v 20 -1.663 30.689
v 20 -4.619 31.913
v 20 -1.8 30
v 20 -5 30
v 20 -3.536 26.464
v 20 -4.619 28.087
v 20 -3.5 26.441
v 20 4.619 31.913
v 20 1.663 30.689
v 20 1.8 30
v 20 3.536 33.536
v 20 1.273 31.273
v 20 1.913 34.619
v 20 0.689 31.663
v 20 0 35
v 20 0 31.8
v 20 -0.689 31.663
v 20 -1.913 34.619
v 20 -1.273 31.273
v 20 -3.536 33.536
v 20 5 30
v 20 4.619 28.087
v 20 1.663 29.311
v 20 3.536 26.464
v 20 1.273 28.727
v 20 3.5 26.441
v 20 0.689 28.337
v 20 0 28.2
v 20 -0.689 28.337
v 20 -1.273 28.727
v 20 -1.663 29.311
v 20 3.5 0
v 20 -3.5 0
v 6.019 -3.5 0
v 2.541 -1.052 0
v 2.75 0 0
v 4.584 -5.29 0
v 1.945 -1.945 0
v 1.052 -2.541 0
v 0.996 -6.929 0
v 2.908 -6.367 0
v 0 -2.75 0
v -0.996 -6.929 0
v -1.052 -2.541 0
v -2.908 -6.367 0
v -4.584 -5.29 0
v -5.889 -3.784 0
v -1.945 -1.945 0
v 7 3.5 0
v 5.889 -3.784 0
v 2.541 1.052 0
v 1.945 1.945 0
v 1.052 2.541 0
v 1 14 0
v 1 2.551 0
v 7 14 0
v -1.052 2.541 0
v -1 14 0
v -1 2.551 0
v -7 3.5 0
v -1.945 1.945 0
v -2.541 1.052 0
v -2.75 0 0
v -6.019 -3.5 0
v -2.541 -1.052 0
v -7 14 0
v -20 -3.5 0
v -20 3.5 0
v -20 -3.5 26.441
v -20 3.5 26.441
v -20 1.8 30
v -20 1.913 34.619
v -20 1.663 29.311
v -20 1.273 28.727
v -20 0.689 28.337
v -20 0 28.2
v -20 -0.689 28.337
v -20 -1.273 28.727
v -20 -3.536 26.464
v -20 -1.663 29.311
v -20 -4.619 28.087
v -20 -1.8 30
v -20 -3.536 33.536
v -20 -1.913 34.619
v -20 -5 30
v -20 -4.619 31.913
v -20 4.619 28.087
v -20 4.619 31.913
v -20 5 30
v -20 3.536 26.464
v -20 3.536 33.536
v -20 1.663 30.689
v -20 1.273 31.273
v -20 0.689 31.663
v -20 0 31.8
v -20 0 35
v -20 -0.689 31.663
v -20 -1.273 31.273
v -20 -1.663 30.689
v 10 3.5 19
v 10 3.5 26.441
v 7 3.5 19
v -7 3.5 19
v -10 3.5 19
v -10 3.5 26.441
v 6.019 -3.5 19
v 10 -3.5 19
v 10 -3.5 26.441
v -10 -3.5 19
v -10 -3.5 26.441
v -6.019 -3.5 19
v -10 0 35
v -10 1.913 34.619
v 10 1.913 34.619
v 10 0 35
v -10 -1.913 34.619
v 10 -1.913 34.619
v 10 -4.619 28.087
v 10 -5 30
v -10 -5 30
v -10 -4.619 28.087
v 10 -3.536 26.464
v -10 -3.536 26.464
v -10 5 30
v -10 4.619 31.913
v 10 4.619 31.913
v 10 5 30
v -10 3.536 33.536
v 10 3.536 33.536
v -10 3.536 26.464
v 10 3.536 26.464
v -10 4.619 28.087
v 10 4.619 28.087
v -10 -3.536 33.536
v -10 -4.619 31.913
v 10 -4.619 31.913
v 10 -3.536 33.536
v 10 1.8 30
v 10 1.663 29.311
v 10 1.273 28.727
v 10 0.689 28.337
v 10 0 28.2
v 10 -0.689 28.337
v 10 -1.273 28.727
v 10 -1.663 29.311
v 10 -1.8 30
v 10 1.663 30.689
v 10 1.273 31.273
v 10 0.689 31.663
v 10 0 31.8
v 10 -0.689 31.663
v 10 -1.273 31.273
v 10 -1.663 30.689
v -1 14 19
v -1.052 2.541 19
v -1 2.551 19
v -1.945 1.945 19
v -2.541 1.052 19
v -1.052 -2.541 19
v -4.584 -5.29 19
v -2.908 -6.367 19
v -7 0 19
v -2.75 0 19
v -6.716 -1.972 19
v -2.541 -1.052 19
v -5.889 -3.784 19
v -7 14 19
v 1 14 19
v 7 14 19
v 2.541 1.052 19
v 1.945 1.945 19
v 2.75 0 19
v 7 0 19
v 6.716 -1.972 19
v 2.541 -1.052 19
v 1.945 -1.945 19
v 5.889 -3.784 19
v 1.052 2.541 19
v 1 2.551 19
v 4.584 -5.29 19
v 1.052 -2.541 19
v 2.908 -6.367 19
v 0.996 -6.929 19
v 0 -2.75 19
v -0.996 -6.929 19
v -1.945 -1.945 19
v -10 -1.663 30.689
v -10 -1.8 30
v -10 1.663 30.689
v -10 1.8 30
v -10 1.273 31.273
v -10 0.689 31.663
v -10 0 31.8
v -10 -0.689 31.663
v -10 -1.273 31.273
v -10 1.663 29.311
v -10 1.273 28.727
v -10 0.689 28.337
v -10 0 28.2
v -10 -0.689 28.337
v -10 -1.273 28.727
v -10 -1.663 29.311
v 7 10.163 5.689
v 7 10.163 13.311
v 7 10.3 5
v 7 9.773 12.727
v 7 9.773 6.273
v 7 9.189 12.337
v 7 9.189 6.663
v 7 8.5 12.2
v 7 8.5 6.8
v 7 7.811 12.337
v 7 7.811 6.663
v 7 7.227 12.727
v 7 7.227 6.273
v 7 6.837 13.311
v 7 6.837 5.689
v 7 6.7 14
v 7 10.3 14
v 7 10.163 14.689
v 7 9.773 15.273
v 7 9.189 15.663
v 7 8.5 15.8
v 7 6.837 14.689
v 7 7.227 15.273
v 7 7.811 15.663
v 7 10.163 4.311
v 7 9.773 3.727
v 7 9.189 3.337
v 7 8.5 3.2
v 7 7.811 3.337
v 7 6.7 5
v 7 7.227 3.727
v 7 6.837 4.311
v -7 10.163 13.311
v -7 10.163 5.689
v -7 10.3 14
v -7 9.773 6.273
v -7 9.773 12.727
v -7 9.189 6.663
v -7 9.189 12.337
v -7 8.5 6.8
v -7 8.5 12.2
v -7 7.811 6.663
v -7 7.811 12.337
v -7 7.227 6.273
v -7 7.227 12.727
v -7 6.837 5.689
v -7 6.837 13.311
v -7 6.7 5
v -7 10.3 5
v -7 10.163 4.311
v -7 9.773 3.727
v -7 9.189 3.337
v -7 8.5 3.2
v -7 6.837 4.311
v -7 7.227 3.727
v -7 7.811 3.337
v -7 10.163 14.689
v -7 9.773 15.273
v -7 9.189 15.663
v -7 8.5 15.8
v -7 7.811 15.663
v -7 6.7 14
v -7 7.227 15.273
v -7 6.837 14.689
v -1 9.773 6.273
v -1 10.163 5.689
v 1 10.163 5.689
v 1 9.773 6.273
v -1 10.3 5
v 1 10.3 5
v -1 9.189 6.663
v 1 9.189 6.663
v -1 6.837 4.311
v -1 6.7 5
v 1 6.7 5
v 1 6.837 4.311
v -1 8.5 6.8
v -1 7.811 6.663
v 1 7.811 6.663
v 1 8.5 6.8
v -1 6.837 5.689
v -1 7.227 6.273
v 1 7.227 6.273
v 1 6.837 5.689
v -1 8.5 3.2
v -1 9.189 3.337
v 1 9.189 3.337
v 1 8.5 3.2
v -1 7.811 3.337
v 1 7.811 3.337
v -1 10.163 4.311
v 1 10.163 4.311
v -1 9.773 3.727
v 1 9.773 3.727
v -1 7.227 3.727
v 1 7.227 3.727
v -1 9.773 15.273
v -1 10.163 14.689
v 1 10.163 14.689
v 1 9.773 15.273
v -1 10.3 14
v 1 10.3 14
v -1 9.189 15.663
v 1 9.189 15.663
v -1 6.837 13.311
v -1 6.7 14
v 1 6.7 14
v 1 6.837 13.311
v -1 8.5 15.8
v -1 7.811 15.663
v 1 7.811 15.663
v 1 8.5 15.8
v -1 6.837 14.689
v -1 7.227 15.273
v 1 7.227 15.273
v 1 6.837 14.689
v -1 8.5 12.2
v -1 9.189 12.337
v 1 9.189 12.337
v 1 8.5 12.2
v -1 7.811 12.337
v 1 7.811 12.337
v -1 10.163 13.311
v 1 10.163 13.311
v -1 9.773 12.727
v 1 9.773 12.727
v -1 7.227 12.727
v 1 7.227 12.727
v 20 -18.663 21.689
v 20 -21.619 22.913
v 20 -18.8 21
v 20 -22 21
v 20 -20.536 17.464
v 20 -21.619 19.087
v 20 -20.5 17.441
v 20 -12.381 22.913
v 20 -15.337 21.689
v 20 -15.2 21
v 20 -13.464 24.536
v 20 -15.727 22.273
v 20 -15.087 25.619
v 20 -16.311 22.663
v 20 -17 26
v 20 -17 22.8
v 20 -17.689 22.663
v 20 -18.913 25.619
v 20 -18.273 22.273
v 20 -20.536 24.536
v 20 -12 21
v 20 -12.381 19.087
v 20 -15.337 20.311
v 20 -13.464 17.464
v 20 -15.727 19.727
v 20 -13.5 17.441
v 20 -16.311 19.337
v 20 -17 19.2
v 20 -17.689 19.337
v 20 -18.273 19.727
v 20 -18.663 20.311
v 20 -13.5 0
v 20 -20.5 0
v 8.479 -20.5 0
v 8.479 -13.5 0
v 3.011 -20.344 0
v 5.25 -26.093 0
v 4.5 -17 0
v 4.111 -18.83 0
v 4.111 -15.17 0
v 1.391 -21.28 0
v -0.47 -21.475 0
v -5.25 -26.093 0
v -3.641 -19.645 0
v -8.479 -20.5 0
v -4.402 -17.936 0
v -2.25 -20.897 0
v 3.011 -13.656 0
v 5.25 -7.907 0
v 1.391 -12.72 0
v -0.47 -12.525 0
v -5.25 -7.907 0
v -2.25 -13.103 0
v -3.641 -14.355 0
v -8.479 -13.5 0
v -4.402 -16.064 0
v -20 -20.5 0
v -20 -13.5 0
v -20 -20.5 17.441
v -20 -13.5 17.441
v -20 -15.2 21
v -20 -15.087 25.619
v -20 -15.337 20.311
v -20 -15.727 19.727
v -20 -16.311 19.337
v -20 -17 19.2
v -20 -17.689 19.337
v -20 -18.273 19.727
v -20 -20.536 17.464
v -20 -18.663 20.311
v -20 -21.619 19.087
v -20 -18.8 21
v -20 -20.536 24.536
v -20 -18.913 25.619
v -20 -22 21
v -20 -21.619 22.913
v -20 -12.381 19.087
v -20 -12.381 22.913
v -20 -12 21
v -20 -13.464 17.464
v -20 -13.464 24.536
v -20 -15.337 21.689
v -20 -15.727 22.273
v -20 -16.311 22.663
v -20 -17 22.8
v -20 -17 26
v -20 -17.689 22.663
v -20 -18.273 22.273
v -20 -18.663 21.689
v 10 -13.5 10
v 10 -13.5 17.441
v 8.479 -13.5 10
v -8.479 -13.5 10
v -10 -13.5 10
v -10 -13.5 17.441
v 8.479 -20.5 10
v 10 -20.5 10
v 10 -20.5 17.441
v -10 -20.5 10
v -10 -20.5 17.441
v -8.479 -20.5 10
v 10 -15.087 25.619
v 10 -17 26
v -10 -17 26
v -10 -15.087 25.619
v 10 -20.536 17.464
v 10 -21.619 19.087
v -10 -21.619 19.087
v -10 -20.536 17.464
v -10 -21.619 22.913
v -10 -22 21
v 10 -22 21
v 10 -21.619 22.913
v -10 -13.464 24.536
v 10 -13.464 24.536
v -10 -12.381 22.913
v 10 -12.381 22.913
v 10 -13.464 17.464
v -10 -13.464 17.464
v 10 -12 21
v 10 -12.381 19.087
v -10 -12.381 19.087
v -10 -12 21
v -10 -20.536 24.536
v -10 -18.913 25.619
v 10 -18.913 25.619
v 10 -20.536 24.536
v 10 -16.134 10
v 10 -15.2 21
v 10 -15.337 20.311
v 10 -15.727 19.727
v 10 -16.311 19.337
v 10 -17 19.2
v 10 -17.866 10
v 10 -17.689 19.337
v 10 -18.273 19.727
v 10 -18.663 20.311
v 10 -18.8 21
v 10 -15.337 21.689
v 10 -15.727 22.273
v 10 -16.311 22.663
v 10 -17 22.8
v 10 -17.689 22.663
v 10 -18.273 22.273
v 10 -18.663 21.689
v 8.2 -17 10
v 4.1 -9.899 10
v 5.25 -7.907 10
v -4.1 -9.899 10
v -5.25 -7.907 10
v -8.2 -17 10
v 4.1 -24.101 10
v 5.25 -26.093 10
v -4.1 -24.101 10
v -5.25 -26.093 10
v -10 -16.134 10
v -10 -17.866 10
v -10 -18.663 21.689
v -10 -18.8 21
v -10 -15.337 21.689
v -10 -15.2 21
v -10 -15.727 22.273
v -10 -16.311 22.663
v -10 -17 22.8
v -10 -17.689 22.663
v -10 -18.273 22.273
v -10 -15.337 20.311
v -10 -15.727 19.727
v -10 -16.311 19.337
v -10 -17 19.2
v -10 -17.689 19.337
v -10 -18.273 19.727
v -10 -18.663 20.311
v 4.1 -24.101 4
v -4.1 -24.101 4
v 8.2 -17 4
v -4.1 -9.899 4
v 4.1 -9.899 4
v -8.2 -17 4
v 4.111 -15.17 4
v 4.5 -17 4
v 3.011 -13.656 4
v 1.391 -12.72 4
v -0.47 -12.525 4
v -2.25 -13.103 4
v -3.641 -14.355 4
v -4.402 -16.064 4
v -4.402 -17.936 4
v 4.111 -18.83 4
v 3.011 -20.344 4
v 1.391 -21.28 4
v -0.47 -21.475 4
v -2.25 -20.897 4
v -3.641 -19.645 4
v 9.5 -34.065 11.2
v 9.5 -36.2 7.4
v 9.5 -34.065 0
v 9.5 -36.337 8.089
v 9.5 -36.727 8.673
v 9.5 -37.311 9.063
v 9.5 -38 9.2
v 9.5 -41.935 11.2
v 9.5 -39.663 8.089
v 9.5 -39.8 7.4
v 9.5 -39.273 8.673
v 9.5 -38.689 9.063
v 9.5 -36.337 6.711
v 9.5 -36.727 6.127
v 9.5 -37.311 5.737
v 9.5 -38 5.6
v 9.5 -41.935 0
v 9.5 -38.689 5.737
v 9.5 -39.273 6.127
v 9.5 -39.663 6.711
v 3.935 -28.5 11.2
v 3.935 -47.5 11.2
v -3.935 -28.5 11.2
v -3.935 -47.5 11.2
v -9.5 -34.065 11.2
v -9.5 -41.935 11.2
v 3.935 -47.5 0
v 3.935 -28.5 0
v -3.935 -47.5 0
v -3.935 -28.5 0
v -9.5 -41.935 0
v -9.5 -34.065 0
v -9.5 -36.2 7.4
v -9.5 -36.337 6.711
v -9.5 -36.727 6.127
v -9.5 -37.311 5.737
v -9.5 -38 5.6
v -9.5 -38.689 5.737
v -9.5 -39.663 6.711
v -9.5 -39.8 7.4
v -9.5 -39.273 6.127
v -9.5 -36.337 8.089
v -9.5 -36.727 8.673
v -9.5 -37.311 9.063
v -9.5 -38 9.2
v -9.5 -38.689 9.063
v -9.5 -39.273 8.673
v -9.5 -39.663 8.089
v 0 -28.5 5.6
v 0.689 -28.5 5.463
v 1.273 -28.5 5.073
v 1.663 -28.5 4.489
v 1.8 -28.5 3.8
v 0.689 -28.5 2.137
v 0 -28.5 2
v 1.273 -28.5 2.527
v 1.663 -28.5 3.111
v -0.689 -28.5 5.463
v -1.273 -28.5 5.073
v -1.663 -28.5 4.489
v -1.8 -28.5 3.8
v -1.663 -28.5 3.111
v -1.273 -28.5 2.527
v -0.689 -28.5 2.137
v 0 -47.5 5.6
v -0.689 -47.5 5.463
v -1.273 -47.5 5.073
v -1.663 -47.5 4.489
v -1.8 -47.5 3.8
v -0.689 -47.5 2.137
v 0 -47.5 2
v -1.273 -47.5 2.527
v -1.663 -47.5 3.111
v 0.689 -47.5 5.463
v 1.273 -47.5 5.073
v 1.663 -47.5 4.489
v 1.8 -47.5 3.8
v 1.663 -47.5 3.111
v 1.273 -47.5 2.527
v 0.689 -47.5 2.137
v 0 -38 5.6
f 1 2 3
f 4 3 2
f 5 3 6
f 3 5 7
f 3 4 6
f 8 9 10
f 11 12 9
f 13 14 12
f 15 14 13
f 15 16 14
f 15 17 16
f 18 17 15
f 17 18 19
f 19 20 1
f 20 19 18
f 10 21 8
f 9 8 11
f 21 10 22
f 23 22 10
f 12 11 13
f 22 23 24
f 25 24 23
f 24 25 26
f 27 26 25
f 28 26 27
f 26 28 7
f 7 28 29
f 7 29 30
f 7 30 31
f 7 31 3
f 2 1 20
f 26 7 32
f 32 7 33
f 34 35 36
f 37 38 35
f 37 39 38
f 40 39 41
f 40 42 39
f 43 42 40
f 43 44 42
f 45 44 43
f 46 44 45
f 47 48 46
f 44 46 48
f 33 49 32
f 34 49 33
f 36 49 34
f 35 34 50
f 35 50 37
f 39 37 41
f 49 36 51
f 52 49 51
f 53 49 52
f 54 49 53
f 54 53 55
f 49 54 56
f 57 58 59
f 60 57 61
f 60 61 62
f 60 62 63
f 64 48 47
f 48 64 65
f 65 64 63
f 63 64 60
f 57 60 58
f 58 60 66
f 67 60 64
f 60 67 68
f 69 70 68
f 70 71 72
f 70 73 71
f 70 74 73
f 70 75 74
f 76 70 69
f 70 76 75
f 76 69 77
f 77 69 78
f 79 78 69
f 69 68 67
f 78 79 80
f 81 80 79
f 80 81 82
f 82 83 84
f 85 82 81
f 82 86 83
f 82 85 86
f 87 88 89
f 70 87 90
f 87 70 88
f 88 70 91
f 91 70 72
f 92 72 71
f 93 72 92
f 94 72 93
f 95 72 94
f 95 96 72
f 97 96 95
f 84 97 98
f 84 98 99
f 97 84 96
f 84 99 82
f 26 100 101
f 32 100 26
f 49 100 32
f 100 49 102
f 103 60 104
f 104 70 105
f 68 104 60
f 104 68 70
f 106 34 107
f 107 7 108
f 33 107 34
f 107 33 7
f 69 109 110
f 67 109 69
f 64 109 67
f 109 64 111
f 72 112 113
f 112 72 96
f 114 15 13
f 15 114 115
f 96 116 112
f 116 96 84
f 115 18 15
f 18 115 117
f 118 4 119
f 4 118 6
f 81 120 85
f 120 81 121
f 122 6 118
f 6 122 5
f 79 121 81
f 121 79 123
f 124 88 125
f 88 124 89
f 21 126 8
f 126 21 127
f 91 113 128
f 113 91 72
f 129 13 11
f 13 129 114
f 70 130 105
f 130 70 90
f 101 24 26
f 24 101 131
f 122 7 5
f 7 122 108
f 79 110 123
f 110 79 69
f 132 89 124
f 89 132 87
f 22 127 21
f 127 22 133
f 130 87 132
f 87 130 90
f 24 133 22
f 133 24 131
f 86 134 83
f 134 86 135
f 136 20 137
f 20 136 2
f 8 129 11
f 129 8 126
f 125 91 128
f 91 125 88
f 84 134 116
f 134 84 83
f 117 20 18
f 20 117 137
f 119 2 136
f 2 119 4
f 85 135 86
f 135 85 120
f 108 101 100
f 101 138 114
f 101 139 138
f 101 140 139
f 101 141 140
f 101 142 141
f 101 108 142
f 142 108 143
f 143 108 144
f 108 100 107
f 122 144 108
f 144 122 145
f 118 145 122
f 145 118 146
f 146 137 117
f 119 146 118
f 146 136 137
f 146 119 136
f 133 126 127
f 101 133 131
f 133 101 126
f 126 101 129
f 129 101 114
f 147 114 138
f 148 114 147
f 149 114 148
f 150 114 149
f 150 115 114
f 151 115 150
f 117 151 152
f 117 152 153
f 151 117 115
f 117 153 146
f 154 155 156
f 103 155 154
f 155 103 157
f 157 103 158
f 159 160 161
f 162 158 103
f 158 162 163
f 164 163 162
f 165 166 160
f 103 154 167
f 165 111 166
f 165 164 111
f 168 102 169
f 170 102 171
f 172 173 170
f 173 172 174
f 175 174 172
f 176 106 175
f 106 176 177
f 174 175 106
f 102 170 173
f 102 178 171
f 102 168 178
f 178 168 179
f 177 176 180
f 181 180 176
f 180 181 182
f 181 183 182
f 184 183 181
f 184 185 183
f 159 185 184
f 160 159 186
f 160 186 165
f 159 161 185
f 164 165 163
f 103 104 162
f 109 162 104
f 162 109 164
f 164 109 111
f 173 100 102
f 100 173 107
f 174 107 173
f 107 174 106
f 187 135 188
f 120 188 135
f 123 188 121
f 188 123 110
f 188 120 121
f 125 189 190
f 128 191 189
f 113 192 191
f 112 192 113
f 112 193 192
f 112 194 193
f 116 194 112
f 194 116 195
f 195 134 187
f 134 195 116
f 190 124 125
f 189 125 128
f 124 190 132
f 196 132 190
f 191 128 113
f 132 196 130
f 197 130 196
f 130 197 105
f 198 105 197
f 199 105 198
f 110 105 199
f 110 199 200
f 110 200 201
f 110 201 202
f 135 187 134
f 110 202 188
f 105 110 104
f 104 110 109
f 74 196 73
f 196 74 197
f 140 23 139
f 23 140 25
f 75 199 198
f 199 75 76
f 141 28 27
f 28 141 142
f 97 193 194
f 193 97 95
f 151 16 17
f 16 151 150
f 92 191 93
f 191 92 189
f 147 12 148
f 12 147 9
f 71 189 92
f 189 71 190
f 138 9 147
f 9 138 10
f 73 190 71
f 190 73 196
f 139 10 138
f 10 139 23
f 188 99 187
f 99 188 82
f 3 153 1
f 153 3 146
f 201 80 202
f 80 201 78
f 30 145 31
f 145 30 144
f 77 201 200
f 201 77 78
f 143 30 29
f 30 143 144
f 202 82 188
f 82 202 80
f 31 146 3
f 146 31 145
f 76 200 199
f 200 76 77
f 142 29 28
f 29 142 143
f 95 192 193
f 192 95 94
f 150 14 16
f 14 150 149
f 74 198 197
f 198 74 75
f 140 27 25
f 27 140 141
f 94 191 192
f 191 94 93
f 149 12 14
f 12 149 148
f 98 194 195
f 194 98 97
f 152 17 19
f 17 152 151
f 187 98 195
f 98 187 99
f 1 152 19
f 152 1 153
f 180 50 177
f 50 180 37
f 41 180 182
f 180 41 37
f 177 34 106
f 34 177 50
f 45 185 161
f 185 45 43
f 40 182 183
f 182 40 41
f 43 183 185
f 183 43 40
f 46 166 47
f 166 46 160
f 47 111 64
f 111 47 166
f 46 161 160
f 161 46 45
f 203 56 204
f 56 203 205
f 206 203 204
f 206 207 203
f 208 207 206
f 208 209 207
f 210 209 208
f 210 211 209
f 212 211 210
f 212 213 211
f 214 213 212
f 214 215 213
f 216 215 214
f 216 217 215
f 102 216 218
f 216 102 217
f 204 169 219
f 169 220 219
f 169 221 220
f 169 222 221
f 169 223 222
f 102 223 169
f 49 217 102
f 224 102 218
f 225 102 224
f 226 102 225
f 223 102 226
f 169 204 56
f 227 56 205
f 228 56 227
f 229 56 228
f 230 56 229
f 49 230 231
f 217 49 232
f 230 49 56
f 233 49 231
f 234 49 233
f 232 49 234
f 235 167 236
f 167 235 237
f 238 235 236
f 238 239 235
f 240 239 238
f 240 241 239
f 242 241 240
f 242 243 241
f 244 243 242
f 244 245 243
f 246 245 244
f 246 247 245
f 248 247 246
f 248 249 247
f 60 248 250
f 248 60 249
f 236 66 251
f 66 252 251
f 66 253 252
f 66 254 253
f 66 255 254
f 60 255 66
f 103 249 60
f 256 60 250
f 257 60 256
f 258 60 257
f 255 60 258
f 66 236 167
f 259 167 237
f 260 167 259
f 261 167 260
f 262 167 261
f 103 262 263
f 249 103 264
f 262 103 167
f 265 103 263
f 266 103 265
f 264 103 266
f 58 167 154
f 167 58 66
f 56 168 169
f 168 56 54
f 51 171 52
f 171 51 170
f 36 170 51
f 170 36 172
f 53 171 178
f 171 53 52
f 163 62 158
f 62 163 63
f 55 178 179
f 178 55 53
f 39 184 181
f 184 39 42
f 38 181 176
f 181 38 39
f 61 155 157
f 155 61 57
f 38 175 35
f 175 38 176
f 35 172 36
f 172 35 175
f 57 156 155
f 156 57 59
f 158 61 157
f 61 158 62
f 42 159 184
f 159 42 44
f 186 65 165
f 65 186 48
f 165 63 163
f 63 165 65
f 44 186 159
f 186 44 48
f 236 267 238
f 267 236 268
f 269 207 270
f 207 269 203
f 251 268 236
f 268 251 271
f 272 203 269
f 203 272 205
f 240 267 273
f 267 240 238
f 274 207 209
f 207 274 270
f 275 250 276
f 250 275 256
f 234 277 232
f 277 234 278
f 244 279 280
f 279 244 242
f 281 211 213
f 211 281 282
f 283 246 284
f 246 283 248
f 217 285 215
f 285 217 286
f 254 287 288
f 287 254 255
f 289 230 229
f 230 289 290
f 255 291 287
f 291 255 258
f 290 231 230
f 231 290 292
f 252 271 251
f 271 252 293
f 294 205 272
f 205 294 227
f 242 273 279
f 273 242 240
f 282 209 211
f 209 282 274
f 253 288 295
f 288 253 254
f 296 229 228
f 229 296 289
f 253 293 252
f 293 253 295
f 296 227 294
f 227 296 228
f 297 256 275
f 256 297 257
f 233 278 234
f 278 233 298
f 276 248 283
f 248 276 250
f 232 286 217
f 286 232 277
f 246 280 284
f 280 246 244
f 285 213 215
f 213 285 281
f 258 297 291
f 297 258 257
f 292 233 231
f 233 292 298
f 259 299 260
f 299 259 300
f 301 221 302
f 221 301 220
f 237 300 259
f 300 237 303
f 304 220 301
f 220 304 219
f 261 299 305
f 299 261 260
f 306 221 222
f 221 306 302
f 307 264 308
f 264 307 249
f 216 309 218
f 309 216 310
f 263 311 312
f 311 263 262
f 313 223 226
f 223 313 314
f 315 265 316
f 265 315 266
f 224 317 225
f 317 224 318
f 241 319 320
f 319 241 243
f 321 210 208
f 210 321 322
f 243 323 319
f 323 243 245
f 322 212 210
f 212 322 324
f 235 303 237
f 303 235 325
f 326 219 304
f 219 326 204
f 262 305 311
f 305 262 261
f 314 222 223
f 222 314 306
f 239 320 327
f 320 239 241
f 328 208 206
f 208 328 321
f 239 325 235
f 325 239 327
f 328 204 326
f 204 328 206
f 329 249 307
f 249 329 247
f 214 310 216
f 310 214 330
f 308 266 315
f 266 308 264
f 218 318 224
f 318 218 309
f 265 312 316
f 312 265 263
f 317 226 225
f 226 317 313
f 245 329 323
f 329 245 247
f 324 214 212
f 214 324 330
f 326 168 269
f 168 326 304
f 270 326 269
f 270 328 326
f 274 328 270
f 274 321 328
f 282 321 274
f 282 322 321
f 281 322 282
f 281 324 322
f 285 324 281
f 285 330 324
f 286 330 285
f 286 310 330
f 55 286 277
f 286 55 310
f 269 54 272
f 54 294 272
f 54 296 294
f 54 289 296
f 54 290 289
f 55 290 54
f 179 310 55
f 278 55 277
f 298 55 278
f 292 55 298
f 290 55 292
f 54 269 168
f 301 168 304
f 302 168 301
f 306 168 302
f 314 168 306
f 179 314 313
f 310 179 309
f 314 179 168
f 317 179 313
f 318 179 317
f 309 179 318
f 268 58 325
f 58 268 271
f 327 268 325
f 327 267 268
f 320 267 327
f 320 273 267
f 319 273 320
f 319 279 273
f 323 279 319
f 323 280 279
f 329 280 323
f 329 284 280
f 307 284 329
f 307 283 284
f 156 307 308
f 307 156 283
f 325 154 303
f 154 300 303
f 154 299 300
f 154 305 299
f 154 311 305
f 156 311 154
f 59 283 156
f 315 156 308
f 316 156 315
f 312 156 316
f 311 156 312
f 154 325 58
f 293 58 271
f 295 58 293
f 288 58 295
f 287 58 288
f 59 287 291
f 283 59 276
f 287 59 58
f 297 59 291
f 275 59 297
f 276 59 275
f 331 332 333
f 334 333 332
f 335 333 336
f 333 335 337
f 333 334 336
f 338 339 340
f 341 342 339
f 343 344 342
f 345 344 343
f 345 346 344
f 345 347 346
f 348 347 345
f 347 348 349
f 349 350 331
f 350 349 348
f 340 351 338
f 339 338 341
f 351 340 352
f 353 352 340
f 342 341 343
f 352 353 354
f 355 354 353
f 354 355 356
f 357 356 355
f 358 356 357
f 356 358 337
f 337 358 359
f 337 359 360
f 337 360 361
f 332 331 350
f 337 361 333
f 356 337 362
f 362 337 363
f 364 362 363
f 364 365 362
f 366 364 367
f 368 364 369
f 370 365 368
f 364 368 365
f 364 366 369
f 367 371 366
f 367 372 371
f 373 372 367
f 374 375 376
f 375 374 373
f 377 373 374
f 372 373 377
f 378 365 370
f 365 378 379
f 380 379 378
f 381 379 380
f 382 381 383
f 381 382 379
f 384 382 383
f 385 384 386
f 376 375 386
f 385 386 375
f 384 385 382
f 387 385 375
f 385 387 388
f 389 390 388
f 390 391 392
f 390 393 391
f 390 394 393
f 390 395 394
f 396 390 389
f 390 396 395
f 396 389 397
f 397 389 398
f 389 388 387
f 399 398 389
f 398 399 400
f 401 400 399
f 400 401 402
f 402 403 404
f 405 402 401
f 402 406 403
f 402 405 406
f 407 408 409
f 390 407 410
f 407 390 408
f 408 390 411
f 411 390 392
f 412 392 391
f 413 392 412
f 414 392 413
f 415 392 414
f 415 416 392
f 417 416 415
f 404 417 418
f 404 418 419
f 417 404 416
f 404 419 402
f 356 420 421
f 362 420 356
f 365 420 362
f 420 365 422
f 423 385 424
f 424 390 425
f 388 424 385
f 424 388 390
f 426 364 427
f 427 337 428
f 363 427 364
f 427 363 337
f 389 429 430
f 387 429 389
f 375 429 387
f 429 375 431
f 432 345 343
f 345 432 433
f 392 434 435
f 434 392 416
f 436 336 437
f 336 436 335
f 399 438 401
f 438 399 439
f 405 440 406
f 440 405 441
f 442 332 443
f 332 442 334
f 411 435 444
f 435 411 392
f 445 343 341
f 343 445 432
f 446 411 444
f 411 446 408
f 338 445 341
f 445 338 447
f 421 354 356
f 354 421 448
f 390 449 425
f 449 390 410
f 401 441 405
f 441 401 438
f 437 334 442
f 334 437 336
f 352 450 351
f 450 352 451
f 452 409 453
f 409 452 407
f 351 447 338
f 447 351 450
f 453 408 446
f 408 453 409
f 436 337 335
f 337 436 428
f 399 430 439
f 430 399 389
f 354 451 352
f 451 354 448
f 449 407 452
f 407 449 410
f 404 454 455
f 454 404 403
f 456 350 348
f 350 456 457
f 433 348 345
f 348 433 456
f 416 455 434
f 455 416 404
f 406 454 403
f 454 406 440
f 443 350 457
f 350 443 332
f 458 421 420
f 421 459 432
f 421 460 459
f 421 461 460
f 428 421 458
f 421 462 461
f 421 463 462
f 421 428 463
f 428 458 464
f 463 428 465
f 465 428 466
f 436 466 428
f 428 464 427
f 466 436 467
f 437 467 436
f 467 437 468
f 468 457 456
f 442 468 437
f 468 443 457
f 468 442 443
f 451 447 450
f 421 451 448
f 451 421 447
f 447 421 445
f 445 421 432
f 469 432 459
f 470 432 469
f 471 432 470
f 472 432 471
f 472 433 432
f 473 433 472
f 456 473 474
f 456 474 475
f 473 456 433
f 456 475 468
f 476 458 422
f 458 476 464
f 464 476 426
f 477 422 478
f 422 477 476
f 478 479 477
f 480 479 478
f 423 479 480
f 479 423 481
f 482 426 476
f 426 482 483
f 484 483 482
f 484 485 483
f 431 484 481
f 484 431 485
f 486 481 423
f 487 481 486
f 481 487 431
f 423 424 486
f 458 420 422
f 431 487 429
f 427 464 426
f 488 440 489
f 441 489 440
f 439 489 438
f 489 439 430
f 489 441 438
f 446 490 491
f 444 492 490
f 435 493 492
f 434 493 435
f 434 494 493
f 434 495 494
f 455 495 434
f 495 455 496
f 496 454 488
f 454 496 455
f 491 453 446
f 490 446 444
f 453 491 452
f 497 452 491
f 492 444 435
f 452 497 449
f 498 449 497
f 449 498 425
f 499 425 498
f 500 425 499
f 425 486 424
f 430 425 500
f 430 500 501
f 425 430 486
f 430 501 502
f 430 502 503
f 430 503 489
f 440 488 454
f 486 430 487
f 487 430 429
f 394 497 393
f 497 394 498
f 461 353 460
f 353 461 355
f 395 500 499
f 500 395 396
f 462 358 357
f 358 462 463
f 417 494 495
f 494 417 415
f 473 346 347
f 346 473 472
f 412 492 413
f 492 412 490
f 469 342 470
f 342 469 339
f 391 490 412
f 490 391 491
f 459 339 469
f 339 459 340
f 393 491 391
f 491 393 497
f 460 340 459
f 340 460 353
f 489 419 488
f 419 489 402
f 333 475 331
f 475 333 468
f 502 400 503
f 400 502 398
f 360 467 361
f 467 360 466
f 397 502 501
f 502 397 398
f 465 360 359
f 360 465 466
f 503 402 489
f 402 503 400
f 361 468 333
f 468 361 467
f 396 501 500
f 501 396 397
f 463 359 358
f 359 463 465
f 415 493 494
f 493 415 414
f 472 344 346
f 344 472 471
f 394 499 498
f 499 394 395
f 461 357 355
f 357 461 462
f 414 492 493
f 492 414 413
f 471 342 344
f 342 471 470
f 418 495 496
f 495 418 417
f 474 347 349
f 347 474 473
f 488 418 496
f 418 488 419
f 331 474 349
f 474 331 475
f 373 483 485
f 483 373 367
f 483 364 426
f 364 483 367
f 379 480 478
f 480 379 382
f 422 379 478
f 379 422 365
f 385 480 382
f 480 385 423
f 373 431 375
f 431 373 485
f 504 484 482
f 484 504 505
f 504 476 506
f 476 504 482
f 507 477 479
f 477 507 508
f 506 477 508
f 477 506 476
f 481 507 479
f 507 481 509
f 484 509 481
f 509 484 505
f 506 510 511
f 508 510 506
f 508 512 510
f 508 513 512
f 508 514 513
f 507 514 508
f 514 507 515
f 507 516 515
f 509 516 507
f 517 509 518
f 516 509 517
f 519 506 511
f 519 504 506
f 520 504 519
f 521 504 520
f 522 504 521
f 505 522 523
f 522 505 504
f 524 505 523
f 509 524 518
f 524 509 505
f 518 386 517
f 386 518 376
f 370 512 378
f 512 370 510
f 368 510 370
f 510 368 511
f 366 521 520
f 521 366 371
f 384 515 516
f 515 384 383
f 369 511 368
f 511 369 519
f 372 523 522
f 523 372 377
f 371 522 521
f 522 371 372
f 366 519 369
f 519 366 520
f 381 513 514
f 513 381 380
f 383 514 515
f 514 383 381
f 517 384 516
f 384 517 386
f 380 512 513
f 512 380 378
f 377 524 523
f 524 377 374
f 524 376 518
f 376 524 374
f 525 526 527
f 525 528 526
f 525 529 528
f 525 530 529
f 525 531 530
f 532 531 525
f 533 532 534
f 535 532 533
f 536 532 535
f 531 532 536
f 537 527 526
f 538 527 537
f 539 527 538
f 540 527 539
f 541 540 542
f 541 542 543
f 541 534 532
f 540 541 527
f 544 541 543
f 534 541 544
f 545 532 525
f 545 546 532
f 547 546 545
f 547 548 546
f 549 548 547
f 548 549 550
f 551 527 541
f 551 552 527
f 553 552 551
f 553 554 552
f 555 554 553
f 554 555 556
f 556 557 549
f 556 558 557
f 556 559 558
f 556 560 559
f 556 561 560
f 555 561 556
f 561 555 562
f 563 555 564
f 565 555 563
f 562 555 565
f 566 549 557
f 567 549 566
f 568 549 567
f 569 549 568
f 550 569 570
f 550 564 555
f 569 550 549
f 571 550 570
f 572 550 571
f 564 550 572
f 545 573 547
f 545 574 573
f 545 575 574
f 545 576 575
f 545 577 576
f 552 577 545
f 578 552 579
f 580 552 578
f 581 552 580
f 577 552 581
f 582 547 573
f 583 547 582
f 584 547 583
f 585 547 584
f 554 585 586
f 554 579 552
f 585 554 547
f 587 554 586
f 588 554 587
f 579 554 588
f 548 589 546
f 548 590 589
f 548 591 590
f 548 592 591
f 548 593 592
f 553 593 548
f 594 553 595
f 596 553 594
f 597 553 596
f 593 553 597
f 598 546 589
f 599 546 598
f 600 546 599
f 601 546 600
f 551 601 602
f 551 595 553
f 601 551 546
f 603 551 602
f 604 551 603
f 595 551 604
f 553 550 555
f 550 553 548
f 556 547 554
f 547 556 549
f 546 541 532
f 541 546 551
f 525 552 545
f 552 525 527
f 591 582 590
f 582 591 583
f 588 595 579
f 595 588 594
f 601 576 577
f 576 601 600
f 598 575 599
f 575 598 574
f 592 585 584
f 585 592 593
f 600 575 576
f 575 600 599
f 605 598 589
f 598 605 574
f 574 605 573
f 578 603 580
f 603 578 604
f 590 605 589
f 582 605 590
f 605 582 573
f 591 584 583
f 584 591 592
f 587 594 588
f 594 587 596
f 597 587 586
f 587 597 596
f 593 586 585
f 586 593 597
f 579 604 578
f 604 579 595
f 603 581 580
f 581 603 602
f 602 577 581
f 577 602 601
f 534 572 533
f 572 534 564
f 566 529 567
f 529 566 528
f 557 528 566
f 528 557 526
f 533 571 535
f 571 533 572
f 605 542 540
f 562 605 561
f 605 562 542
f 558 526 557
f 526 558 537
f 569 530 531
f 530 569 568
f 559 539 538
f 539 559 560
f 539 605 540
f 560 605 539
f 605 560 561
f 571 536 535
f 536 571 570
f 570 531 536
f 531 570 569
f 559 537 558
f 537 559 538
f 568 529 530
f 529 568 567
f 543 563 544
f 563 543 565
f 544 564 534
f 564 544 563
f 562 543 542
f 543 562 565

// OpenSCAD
// file: functions.scad
// PRUSA Mendel  
// Functions used in many files
// GNU GPL v2
// Josef Průša
// josefprusa@me.com
// prusadjs.cz
// http://www.reprap.org/wiki/Prusa_Mendel
// http://github.com/prusajr/PrusaMendel

module nut(d,h,horizontal=true){
cornerdiameter =  (d / 2) / cos (180 / 6);
cylinder(h = h, r = cornerdiameter, $fn = 6);
if(horizontal){
for(i = [1:6]){
	rotate([0,0,60*i]) translate([-cornerdiameter-0.2,0,0]) rotate([0,0,-45]) cube(size = [2,2,h]);
}}
}

// By nophead
module polyhole(d,h) {
    n = max(round(2 * d),3);
    rotate([0,0,180])
        cylinder(h = h, r = (d / 2) / cos (180 / n), $fn = n);
}




module roundcorner(diameter){
	difference(){
		cube(size = [diameter,diameter,99], center = false);
		translate(v = [diameter, diameter, 0]) cylinder(h = 100, r=diameter, center=true);
	}
}
// file: metric.scad
// PRUSA Mendel  
// Default metric sizes
// GNU GPL v2
// Josef Průša
// josefprusa@me.com
// prusadjs.cz
// http://www.reprap.org/wiki/Prusa_Mendel
// http://github.com/prusajr/PrusaMendel

// DONT CHANGE THIS FILE! ALTER VALUES IN CONFIGURATION.SCAD INSTEAD

// RODS

threaded_rod_diameter = 8.2;
threaded_rod_diameter_horizontal = 8.2;
smooth_bar_diameter = 8;
smooth_bar_diameter_horizontal = 8.5;

// Nuts and bolts

m8_diameter = 9;
m8_nut_diameter = 16.4;

m4_diameter = 4.5;
m4_nut_diameter = 9;

m3_diameter = 3.6;
m3_nut_diameter = 6.1;

// Bushing holder

bushing_core_diameter = smooth_bar_diameter;
bushing_material_thickness = 1;

// Motors

motor_shaft = 5.5;
// file: configuration.scad
// PRUSA Mendel  
// Configuration file
// GNU GPL v2
// Josef Průša
// josefprusa@me.com
// prusadjs.cz
// http://www.reprap.org/wiki/Prusa_Mendel
// http://github.com/prusajr/PrusaMendel

// PLEASE SELECT ONE OF THE CONFIGURATIONS BELOW
// BY UN-COMMENTING IT

// Uncomment for metric settings
// METRIC METRIC METRIC METRIC METRIC METRIC METRIC METRIC 

include <metric.scad>

// Uncomment for imperial settings
// IMPERIAL IMPERIAL IMPERIAL IMPERIAL IMPERIAL IMPERIAL IMPERIAL 

// include sae.scad;


// CUSTOM CUSTOM CUSTOM CUSTOM CUSTOM CUSTOM CUSTOM CUSTOM CUSTOM

thin_wall = 3;


// CHANGE ONLY THE STUFF YOU KNOW
// IT WILL REPLACE DEFAULT SETTING

// RODS

// threaded_rod_diameter = 0;
// threaded_rod_diameter_horizontal = 0;
// smooth_bar_díameter = 0;
// smooth_bar_díameter_horizontal = 0;

// Nuts and bolts

// m8_diameter = 0;
// m8_nut_diameter = 0;

// m4_diameter = 0;
// m4_nut_diameter = 0;

// m3_diameter = 0;
// m3_nut_diameter = 0;

// Bushing holder

// bushing_core_diameter = smooth_bar_díameter;
// bushing_material_thickness = 0;


///counted stuff
m3_nut_diameter_bigger = ((m3_nut_diameter  / 2) / cos (180 / 6))*2;

// functions 
include <functions.scad>
// main file
// PRUSA Mendel  
// motor/leadscrew coupling
// Used for connecting motor to leadscrew
// GNU GPL v2
// Josef Průša
// josefprusa@me.com
// prusadjs.cz
// http://www.reprap.org/wiki/Prusa_Mendel
// http://github.com/prusajr/PrusaMendel
include <configuration.scad>

/**
 *@name Coupling
 *@using 1 m3x25
 *@using 1 m3nut
 *@using 2 m3washer
 */

module coupling_heads(base_height){
difference(){
union(){
	translate(v = [0, 0, (30-19+base_height)/2]) cube(size = [40,7,30-19+base_height], center = true);
	
	translate(v = [-20, 0, 30-19+base_height]) rotate ([0,90,0]) cylinder(h = 40, r=5, $fn=16);
}

//cube cutout for coupling center pice
translate(v = [0, 0, 19+25-19+base_height]) cube(size = [20,20,50], center = true);

//coupling hole
translate(v = [-25, 0, 30-19+base_height]) rotate ([0,90,0]) cylinder(h = 50, r=m3_diameter/2, $fn=16);
}
}

module coupling_motor(){
difference(){
union(){
	coupling_heads(19);
	cylinder(h = 19, r=7);
	translate(v = [0, 7, 9.5]) cube(size = [14,14,19], center = true);
	
}

// inside diameter
translate(v = [0, 0, -1])cylinder(h = 30, r=motor_shaft/2, $fn=16);


// screw holes
rotate ([0,0,90]) translate(v = [8.5, 15, 5]) rotate ([90,0,0]) cylinder(h = 30, r=m3_diameter/2, $fn=16);
rotate ([0,0,90]) translate(v = [8.5, 15, 14]) rotate ([90,0,0]) cylinder(h = 30, r=m3_diameter/2, $fn=16);

//main cut
translate(v = [0, 10, 14]) cube(size = [2,20,35], center = true);

//difference cut
//translate(v = [0, 7, 15])  cube(size = [20,8,1], center = true);
}
}

module coupling_leadscrew(){
difference(){
union(){
	coupling_heads(10);
	cylinder(h = 10, r=(m8_nut_diameter/2)+2.3, $fn=6);
}
//nut cutout
translate(v = [0, 0, 4]) cylinder(h = 10, r=(m8_nut_diameter/2), $fn=6);

//leadscre cutout
translate(v = [0, 0, -1]) cylinder(h = 10, r=(m8_diameter/2));
}
}

module coupling_heart(){
difference(){
union(){
translate(v = [0, 0, (2*m3_diameter+4)/2])	intersection() {
	cube(size = [19,19,2*m3_diameter+4], center=true);
	rotate ([0,0,45]) cube(size = [19,19,2*m3_diameter+4], center=true);
     }
}
rotate ([0,0,90]) translate(v = [-15, 0, 0]) rotate ([0,0,90]) translate(v = [0, 0, m3_diameter/2+2]) rotate ([90,0,0]) cylinder(h = 30, r=m3_diameter/2, $fn=16);
translate(v = [-15, 0, 0]) rotate ([0,0,90]) translate(v = [0, 0, (m3_diameter/2+2)+m3_diameter]) rotate ([90,0,0]) cylinder(h = 30, r=m3_diameter/2, $fn=16);
}
}

coupling_motor();
translate(v = [0, -17, 0]) coupling_leadscrew();
translate(v = [0, -38, 0]) coupling_heart();
/* assembly
coupling_motor();
translate(v = [0, 0, 47]) mirror([ 0, 0, 1 ]) rotate ([0,0,90]) coupling_leadscrew();
translate(v = [0, 0, 21.5]) coupling_heart();
*/
